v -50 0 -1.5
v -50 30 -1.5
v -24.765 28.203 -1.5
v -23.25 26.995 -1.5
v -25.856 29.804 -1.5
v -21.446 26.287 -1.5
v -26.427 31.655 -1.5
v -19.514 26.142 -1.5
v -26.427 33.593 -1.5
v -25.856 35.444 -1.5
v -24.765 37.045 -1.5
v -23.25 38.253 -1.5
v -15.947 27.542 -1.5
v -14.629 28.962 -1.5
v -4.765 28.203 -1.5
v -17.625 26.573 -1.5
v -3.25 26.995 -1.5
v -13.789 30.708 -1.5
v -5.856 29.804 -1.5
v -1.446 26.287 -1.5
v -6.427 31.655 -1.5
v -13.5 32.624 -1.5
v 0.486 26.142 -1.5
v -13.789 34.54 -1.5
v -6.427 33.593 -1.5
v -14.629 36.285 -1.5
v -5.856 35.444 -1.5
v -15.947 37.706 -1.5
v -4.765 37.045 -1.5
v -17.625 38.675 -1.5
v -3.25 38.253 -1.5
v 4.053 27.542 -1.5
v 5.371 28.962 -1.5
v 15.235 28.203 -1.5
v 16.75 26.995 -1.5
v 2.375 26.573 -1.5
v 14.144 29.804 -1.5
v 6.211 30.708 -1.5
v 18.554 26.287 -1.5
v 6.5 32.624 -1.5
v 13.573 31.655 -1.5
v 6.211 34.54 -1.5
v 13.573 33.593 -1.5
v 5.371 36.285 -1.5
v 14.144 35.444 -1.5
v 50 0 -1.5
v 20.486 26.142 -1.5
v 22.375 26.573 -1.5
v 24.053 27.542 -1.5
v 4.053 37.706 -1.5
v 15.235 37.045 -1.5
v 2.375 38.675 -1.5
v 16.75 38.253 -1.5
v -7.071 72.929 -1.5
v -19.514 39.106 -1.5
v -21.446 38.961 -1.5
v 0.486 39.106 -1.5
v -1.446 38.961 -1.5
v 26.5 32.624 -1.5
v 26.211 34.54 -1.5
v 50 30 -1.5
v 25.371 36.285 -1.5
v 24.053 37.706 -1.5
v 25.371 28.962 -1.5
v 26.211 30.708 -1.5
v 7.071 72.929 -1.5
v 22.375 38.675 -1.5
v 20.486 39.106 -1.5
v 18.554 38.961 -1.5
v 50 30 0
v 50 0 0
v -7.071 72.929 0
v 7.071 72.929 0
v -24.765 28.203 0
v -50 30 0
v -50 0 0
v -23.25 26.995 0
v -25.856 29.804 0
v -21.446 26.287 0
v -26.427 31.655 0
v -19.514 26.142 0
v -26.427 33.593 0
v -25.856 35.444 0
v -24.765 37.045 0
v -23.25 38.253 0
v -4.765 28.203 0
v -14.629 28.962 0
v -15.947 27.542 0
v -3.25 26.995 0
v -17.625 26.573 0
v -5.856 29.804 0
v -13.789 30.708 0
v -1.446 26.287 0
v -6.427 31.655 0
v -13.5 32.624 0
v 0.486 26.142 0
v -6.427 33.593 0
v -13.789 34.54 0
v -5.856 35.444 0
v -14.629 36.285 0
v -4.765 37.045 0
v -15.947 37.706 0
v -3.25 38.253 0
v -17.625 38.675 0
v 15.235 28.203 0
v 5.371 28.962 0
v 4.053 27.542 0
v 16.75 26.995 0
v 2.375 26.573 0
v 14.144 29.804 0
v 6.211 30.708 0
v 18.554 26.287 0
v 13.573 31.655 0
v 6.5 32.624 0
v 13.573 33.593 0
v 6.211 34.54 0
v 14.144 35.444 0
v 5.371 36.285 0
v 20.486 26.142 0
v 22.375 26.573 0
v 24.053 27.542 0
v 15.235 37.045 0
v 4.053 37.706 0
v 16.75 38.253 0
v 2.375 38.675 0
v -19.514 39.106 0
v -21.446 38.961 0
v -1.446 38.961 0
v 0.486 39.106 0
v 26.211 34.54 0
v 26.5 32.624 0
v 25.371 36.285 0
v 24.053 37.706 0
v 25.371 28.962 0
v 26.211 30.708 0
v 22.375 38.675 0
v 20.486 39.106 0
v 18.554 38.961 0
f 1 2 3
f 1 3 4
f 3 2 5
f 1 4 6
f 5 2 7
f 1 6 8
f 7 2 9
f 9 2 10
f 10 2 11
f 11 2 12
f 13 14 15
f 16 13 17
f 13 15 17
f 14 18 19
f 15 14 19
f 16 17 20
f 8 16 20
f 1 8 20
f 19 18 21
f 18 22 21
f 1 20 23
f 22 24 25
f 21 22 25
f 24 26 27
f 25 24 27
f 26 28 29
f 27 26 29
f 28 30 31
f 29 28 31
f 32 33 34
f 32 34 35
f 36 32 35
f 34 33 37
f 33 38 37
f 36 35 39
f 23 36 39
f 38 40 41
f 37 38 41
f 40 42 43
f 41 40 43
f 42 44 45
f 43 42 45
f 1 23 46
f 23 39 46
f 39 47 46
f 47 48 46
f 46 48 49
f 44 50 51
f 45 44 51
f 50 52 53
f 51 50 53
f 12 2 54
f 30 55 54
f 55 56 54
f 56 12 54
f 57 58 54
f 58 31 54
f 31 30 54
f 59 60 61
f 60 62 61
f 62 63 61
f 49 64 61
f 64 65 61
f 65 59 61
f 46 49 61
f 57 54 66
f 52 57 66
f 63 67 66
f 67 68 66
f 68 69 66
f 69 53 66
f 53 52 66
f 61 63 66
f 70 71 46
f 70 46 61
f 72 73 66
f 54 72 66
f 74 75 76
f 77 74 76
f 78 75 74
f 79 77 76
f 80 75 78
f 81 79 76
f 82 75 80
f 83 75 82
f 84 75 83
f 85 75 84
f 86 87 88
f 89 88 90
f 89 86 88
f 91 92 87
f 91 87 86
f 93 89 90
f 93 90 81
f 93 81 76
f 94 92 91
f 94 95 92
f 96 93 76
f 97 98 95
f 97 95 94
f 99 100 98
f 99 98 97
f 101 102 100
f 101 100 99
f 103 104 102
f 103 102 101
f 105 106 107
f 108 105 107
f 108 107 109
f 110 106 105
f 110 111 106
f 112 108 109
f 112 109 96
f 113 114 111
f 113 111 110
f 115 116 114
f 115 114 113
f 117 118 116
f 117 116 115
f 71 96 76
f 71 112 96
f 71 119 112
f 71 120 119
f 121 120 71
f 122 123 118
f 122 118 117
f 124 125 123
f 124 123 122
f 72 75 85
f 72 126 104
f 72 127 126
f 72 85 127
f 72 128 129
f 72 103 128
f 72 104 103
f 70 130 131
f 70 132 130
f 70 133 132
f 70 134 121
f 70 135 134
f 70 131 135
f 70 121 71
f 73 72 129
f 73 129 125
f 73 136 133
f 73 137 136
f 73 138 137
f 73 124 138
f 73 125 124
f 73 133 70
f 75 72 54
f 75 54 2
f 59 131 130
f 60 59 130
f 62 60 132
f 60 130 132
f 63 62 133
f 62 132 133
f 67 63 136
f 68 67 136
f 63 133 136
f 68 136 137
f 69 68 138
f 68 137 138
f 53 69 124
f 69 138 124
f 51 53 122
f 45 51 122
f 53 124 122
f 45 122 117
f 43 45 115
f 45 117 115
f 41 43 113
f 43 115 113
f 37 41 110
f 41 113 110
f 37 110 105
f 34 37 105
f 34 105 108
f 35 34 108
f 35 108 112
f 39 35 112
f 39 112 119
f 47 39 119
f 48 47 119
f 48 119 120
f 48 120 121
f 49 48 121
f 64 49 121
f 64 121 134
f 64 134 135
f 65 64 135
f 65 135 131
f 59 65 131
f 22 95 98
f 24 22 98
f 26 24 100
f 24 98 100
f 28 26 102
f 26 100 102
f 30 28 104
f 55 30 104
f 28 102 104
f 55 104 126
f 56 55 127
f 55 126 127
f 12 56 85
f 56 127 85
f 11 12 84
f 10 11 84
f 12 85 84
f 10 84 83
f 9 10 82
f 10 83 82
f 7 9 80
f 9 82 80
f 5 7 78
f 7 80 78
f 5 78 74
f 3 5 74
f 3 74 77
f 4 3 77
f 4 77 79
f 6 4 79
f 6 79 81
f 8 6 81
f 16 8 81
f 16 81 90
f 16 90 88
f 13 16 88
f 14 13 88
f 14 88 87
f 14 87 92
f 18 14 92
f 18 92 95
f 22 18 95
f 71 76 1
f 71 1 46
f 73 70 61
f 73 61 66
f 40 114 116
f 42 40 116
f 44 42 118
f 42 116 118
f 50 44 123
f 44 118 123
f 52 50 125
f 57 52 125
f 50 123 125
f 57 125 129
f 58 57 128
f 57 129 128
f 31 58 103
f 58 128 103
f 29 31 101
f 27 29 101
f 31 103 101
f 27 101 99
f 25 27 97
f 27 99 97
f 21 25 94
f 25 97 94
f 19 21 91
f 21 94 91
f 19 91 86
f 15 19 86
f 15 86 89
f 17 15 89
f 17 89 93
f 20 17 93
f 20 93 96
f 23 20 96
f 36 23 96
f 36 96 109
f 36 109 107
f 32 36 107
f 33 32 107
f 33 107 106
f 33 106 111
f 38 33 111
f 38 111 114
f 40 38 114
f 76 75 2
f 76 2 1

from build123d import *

# Parameters (mm, degrees)
SM_BASE_FLANGE_1_DEPTH     = 1.5
SKETCH_6_R                 = 6.5
CUT_EXTRUDE_1_DEPTH        = 10
PATTERN_LINEAR_1_COUNT     = 2
PATTERN_LINEAR_1_PITCH     = 20
PATTERN_LINEAR_1_COL_COUNT = 2
PATTERN_LINEAR_1_COL_PITCH = 20
CHAMFER_1_SIZE             = 10


# Sheet-metal steps are written as plain solids
with BuildPart() as part:
    # Sketch 1 → Базовая кромка1 (new body)
    with BuildSketch(Plane.XY):
        Polygon((-50, 0), (50, 0), (50, 30), (0, 80), (-50, 30), align=None)
    extrude(amount=-SM_BASE_FLANGE_1_DEPTH)

    # Эскиз6 → Вырез-Вытянуть1 (cut)
    with BuildSketch(Plane.XY):
        with Locations((0, 32.623845661)):
            Circle(SKETCH_6_R)
    cut_extrude_1 = extrude(amount=-CUT_EXTRUDE_1_DEPTH, mode=Mode.SUBTRACT)

    # Линейный массив1: Вырез-Вытянуть1 ×2
    with Locations(*[(-i * PATTERN_LINEAR_1_PITCH, 0, 0) for i in range(1, PATTERN_LINEAR_1_COUNT)]):
        add(cut_extrude_1, mode=Mode.SUBTRACT)

    # Линейный массив1 col: Вырез-Вытянуть1 ×2
    with Locations(*[(i * PATTERN_LINEAR_1_COL_PITCH, 0, 0) for i in range(1, PATTERN_LINEAR_1_COL_COUNT)]):
        add(cut_extrude_1, mode=Mode.SUBTRACT)

    # Фаска1
    chamfer_1_edges = [part.edges().sort_by_distance(p)[0] for p in [
        (0, 80, -0.75),
    ]]
    chamfer(chamfer_1_edges, length=CHAMFER_1_SIZE)


solid = part.part
